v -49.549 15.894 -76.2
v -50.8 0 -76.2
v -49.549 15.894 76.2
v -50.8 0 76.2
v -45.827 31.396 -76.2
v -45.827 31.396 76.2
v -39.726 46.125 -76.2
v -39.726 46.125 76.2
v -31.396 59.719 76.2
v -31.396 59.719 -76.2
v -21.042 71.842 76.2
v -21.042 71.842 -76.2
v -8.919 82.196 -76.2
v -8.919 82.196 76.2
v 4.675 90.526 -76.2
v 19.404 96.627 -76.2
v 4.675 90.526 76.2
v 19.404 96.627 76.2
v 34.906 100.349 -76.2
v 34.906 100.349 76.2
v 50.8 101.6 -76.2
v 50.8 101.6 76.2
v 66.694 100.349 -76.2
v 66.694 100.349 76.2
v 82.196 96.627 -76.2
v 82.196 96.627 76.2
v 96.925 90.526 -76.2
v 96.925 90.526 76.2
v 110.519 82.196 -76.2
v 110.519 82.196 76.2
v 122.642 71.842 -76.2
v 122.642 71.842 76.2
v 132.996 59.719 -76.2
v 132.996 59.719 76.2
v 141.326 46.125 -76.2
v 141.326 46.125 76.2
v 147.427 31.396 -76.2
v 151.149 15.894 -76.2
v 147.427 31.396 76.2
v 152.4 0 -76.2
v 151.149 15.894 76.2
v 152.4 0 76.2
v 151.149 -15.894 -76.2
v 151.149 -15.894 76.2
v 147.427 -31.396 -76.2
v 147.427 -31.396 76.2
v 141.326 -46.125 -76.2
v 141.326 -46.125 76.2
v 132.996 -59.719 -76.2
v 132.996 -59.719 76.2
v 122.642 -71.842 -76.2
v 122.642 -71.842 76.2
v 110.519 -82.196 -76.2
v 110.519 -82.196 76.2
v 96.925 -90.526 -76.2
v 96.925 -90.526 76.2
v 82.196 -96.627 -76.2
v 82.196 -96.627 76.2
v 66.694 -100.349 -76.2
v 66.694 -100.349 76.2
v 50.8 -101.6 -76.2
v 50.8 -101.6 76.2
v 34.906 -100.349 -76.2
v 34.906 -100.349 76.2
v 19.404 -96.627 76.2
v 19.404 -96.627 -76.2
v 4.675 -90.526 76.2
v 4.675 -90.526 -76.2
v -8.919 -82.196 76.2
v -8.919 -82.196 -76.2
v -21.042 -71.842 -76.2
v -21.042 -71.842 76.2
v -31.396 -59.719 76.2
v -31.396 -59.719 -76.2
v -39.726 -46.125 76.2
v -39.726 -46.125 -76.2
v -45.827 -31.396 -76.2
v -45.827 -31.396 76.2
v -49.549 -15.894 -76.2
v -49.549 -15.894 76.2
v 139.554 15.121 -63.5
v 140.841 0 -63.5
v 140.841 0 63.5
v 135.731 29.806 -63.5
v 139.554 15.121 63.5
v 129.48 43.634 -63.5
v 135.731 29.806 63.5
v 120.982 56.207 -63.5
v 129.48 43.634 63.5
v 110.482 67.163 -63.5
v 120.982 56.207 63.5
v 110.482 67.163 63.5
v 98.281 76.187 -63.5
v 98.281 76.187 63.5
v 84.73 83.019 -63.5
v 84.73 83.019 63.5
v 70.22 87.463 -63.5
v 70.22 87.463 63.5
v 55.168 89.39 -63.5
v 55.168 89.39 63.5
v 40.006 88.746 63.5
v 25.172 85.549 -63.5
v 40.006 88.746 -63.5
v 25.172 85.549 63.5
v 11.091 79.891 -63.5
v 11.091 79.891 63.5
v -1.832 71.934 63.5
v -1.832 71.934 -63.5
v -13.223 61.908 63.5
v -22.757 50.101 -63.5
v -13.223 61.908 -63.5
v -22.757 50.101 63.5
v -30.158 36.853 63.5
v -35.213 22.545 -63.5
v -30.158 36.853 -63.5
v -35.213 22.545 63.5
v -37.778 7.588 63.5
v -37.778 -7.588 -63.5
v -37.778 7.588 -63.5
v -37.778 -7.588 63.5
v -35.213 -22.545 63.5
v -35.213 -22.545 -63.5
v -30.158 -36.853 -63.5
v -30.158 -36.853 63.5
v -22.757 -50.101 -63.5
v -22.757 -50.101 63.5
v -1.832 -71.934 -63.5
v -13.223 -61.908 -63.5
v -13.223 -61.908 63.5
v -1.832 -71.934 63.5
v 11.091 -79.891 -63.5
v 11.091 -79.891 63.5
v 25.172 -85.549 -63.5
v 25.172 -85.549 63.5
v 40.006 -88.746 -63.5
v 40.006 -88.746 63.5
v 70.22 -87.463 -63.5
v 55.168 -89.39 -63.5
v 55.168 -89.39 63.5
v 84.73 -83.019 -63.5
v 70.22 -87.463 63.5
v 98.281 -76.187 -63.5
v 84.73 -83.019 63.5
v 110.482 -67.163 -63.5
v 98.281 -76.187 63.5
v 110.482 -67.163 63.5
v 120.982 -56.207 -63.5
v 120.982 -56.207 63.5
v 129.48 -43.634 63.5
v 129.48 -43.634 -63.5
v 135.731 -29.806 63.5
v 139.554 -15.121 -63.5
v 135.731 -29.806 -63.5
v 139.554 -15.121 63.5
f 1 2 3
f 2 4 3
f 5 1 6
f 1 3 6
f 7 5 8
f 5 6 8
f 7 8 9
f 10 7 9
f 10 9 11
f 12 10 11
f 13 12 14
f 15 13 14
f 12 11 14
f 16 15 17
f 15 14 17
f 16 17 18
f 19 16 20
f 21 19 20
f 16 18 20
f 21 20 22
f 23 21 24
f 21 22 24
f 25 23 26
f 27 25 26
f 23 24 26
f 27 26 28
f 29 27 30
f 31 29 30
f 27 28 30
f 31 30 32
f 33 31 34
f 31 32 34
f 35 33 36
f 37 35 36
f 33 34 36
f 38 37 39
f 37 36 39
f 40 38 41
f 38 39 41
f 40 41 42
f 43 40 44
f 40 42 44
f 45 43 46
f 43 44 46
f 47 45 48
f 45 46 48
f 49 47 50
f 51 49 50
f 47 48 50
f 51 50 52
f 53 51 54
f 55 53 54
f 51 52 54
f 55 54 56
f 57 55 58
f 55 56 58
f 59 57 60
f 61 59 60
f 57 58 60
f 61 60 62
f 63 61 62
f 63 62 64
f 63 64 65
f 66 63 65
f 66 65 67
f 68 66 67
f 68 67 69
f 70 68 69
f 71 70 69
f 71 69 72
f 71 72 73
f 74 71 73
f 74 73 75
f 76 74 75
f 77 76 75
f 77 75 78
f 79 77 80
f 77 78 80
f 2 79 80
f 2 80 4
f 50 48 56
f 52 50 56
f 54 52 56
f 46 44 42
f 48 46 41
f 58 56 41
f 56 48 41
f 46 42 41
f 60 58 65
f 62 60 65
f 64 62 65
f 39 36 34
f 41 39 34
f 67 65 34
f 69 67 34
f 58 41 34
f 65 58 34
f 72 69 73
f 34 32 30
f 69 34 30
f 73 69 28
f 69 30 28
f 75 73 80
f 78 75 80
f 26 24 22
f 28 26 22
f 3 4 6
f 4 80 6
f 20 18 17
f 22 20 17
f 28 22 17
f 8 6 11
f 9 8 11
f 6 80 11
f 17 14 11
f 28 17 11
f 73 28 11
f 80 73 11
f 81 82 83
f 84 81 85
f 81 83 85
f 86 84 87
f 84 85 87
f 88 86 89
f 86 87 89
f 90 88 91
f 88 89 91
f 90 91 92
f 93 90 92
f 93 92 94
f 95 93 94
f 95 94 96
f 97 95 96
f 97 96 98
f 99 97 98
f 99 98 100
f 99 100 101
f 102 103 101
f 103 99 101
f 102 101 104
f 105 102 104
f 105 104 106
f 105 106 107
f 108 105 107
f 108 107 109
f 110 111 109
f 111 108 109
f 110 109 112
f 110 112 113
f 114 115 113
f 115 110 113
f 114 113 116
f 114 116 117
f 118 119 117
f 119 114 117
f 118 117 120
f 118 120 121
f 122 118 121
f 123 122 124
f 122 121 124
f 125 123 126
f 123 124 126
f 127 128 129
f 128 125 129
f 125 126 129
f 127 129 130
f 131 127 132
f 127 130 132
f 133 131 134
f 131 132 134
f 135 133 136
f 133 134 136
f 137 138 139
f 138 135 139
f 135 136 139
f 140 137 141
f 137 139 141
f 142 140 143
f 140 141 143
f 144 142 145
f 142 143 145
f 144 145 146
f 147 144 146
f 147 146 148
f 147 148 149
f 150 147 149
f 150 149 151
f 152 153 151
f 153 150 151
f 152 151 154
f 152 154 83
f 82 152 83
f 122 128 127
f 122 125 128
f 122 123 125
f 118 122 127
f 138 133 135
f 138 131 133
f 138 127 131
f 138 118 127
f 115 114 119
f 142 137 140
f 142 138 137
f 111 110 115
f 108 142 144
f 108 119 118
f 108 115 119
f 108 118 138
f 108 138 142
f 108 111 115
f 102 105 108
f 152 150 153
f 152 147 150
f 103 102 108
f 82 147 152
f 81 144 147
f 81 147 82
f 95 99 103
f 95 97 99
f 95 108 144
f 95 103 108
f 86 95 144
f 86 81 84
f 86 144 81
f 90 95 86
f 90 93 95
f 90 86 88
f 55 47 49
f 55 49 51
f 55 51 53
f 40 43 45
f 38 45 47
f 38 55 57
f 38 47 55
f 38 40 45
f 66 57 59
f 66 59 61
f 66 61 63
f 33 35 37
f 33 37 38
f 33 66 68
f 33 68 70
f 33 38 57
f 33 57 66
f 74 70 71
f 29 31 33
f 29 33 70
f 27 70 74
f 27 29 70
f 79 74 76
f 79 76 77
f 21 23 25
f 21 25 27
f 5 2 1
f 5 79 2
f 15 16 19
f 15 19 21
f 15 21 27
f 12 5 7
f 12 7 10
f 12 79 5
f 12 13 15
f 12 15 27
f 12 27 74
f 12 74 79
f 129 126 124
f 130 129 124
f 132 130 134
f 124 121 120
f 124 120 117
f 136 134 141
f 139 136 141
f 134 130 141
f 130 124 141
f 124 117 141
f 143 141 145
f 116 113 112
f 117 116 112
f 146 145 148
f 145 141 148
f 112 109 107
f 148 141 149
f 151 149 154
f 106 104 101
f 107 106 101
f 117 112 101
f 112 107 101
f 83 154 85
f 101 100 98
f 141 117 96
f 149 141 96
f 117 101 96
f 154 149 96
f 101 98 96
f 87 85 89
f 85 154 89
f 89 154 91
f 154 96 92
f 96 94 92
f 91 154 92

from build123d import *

# Parameters (mm, degrees)
F0_W     = 101.6
F0_H     = 152.4
F2_T     = -12.7
F3_R     = 89.4707101345
F4_DEPTH = 63.5


with BuildPart() as f1:
    # F0 (on Front) → F1 (revolve)
    with BuildSketch(Plane.XZ):
        Rectangle(F0_W, F0_H)
    revolve(axis=Axis((50.8, 0, 0), (0, 0, -1)))

    # F2 (hollow: no face is removed)
    offset(amount=F2_T, mode=Mode.SUBTRACT)

    # F3 (on Top) → F4 (cut, symmetric)
    with BuildSketch(Plane.XY):
        with Locations((51.3707101345, 0)):
            Circle(F3_R)
    extrude(amount=F4_DEPTH, both=True, mode=Mode.SUBTRACT)


solid = f1.part
